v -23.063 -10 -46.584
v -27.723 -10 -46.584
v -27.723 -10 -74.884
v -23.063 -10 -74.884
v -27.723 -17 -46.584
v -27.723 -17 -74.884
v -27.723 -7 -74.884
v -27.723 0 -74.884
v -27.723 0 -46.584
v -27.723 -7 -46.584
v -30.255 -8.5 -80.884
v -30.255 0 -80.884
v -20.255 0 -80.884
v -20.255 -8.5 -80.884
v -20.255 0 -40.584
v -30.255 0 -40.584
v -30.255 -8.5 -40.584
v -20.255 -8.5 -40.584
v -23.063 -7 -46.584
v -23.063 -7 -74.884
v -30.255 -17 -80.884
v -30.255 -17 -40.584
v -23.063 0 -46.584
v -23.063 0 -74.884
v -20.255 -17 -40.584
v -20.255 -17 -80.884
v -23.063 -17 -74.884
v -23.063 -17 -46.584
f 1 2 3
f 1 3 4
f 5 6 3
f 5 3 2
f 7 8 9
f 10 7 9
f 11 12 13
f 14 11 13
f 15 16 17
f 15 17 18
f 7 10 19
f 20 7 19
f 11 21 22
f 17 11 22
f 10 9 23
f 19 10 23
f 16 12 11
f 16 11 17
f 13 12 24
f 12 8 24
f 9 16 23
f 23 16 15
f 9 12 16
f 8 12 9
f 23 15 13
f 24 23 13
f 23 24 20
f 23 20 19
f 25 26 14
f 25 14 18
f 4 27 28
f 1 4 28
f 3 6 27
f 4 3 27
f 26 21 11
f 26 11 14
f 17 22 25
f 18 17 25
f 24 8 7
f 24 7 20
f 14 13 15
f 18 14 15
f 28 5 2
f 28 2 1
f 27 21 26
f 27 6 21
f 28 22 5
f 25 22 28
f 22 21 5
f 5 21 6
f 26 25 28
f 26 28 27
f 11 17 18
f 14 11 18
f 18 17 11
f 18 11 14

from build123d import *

# Parameters (mm, degrees)
F0_W     = 10
F0_H     = 40.3
F0_W_2   = 4.6593984449
F0_H_2   = 28.3
F1_DEPTH = 8.5
F2_DEPTH = 7


# Not quite as in the source:
# - a feature names something its author has since deleted; it is built from what else it names


with BuildPart() as f1:
    # F0 (on Front) → F1 (new body)
    with BuildSketch(Plane.XZ):
        with Locations((-25.2545091997, -60.7344553381)):
            Rectangle(F0_W, F0_H)
        with Locations((-25.3930282849, -60.7344553381)):
            Rectangle(F0_W_2, F0_H_2, mode=Mode.SUBTRACT)
        with Locations((-25.3930282849, -60.7344553381)):
            Rectangle(F0_W_2, F0_H_2)
    extrude(amount=F1_DEPTH)

    # F0 (on Front) → F2 (cut)
    with BuildSketch(Plane.XZ):
        with Locations((-25.3930282849, -60.7344553381)):
            Rectangle(F0_W_2, F0_H_2)
    extrude(amount=F2_DEPTH, mode=Mode.SUBTRACT)


with BuildPart() as f3_1:
    # F3: instance of F1
    add(f1.part.mirror(Plane(origin=(-25.2545091997, -8.5, -60.7344553381), x_dir=(1, 0, 0), z_dir=(0, -1, 0))))


solid = Compound([f1.part, f3_1.part])
